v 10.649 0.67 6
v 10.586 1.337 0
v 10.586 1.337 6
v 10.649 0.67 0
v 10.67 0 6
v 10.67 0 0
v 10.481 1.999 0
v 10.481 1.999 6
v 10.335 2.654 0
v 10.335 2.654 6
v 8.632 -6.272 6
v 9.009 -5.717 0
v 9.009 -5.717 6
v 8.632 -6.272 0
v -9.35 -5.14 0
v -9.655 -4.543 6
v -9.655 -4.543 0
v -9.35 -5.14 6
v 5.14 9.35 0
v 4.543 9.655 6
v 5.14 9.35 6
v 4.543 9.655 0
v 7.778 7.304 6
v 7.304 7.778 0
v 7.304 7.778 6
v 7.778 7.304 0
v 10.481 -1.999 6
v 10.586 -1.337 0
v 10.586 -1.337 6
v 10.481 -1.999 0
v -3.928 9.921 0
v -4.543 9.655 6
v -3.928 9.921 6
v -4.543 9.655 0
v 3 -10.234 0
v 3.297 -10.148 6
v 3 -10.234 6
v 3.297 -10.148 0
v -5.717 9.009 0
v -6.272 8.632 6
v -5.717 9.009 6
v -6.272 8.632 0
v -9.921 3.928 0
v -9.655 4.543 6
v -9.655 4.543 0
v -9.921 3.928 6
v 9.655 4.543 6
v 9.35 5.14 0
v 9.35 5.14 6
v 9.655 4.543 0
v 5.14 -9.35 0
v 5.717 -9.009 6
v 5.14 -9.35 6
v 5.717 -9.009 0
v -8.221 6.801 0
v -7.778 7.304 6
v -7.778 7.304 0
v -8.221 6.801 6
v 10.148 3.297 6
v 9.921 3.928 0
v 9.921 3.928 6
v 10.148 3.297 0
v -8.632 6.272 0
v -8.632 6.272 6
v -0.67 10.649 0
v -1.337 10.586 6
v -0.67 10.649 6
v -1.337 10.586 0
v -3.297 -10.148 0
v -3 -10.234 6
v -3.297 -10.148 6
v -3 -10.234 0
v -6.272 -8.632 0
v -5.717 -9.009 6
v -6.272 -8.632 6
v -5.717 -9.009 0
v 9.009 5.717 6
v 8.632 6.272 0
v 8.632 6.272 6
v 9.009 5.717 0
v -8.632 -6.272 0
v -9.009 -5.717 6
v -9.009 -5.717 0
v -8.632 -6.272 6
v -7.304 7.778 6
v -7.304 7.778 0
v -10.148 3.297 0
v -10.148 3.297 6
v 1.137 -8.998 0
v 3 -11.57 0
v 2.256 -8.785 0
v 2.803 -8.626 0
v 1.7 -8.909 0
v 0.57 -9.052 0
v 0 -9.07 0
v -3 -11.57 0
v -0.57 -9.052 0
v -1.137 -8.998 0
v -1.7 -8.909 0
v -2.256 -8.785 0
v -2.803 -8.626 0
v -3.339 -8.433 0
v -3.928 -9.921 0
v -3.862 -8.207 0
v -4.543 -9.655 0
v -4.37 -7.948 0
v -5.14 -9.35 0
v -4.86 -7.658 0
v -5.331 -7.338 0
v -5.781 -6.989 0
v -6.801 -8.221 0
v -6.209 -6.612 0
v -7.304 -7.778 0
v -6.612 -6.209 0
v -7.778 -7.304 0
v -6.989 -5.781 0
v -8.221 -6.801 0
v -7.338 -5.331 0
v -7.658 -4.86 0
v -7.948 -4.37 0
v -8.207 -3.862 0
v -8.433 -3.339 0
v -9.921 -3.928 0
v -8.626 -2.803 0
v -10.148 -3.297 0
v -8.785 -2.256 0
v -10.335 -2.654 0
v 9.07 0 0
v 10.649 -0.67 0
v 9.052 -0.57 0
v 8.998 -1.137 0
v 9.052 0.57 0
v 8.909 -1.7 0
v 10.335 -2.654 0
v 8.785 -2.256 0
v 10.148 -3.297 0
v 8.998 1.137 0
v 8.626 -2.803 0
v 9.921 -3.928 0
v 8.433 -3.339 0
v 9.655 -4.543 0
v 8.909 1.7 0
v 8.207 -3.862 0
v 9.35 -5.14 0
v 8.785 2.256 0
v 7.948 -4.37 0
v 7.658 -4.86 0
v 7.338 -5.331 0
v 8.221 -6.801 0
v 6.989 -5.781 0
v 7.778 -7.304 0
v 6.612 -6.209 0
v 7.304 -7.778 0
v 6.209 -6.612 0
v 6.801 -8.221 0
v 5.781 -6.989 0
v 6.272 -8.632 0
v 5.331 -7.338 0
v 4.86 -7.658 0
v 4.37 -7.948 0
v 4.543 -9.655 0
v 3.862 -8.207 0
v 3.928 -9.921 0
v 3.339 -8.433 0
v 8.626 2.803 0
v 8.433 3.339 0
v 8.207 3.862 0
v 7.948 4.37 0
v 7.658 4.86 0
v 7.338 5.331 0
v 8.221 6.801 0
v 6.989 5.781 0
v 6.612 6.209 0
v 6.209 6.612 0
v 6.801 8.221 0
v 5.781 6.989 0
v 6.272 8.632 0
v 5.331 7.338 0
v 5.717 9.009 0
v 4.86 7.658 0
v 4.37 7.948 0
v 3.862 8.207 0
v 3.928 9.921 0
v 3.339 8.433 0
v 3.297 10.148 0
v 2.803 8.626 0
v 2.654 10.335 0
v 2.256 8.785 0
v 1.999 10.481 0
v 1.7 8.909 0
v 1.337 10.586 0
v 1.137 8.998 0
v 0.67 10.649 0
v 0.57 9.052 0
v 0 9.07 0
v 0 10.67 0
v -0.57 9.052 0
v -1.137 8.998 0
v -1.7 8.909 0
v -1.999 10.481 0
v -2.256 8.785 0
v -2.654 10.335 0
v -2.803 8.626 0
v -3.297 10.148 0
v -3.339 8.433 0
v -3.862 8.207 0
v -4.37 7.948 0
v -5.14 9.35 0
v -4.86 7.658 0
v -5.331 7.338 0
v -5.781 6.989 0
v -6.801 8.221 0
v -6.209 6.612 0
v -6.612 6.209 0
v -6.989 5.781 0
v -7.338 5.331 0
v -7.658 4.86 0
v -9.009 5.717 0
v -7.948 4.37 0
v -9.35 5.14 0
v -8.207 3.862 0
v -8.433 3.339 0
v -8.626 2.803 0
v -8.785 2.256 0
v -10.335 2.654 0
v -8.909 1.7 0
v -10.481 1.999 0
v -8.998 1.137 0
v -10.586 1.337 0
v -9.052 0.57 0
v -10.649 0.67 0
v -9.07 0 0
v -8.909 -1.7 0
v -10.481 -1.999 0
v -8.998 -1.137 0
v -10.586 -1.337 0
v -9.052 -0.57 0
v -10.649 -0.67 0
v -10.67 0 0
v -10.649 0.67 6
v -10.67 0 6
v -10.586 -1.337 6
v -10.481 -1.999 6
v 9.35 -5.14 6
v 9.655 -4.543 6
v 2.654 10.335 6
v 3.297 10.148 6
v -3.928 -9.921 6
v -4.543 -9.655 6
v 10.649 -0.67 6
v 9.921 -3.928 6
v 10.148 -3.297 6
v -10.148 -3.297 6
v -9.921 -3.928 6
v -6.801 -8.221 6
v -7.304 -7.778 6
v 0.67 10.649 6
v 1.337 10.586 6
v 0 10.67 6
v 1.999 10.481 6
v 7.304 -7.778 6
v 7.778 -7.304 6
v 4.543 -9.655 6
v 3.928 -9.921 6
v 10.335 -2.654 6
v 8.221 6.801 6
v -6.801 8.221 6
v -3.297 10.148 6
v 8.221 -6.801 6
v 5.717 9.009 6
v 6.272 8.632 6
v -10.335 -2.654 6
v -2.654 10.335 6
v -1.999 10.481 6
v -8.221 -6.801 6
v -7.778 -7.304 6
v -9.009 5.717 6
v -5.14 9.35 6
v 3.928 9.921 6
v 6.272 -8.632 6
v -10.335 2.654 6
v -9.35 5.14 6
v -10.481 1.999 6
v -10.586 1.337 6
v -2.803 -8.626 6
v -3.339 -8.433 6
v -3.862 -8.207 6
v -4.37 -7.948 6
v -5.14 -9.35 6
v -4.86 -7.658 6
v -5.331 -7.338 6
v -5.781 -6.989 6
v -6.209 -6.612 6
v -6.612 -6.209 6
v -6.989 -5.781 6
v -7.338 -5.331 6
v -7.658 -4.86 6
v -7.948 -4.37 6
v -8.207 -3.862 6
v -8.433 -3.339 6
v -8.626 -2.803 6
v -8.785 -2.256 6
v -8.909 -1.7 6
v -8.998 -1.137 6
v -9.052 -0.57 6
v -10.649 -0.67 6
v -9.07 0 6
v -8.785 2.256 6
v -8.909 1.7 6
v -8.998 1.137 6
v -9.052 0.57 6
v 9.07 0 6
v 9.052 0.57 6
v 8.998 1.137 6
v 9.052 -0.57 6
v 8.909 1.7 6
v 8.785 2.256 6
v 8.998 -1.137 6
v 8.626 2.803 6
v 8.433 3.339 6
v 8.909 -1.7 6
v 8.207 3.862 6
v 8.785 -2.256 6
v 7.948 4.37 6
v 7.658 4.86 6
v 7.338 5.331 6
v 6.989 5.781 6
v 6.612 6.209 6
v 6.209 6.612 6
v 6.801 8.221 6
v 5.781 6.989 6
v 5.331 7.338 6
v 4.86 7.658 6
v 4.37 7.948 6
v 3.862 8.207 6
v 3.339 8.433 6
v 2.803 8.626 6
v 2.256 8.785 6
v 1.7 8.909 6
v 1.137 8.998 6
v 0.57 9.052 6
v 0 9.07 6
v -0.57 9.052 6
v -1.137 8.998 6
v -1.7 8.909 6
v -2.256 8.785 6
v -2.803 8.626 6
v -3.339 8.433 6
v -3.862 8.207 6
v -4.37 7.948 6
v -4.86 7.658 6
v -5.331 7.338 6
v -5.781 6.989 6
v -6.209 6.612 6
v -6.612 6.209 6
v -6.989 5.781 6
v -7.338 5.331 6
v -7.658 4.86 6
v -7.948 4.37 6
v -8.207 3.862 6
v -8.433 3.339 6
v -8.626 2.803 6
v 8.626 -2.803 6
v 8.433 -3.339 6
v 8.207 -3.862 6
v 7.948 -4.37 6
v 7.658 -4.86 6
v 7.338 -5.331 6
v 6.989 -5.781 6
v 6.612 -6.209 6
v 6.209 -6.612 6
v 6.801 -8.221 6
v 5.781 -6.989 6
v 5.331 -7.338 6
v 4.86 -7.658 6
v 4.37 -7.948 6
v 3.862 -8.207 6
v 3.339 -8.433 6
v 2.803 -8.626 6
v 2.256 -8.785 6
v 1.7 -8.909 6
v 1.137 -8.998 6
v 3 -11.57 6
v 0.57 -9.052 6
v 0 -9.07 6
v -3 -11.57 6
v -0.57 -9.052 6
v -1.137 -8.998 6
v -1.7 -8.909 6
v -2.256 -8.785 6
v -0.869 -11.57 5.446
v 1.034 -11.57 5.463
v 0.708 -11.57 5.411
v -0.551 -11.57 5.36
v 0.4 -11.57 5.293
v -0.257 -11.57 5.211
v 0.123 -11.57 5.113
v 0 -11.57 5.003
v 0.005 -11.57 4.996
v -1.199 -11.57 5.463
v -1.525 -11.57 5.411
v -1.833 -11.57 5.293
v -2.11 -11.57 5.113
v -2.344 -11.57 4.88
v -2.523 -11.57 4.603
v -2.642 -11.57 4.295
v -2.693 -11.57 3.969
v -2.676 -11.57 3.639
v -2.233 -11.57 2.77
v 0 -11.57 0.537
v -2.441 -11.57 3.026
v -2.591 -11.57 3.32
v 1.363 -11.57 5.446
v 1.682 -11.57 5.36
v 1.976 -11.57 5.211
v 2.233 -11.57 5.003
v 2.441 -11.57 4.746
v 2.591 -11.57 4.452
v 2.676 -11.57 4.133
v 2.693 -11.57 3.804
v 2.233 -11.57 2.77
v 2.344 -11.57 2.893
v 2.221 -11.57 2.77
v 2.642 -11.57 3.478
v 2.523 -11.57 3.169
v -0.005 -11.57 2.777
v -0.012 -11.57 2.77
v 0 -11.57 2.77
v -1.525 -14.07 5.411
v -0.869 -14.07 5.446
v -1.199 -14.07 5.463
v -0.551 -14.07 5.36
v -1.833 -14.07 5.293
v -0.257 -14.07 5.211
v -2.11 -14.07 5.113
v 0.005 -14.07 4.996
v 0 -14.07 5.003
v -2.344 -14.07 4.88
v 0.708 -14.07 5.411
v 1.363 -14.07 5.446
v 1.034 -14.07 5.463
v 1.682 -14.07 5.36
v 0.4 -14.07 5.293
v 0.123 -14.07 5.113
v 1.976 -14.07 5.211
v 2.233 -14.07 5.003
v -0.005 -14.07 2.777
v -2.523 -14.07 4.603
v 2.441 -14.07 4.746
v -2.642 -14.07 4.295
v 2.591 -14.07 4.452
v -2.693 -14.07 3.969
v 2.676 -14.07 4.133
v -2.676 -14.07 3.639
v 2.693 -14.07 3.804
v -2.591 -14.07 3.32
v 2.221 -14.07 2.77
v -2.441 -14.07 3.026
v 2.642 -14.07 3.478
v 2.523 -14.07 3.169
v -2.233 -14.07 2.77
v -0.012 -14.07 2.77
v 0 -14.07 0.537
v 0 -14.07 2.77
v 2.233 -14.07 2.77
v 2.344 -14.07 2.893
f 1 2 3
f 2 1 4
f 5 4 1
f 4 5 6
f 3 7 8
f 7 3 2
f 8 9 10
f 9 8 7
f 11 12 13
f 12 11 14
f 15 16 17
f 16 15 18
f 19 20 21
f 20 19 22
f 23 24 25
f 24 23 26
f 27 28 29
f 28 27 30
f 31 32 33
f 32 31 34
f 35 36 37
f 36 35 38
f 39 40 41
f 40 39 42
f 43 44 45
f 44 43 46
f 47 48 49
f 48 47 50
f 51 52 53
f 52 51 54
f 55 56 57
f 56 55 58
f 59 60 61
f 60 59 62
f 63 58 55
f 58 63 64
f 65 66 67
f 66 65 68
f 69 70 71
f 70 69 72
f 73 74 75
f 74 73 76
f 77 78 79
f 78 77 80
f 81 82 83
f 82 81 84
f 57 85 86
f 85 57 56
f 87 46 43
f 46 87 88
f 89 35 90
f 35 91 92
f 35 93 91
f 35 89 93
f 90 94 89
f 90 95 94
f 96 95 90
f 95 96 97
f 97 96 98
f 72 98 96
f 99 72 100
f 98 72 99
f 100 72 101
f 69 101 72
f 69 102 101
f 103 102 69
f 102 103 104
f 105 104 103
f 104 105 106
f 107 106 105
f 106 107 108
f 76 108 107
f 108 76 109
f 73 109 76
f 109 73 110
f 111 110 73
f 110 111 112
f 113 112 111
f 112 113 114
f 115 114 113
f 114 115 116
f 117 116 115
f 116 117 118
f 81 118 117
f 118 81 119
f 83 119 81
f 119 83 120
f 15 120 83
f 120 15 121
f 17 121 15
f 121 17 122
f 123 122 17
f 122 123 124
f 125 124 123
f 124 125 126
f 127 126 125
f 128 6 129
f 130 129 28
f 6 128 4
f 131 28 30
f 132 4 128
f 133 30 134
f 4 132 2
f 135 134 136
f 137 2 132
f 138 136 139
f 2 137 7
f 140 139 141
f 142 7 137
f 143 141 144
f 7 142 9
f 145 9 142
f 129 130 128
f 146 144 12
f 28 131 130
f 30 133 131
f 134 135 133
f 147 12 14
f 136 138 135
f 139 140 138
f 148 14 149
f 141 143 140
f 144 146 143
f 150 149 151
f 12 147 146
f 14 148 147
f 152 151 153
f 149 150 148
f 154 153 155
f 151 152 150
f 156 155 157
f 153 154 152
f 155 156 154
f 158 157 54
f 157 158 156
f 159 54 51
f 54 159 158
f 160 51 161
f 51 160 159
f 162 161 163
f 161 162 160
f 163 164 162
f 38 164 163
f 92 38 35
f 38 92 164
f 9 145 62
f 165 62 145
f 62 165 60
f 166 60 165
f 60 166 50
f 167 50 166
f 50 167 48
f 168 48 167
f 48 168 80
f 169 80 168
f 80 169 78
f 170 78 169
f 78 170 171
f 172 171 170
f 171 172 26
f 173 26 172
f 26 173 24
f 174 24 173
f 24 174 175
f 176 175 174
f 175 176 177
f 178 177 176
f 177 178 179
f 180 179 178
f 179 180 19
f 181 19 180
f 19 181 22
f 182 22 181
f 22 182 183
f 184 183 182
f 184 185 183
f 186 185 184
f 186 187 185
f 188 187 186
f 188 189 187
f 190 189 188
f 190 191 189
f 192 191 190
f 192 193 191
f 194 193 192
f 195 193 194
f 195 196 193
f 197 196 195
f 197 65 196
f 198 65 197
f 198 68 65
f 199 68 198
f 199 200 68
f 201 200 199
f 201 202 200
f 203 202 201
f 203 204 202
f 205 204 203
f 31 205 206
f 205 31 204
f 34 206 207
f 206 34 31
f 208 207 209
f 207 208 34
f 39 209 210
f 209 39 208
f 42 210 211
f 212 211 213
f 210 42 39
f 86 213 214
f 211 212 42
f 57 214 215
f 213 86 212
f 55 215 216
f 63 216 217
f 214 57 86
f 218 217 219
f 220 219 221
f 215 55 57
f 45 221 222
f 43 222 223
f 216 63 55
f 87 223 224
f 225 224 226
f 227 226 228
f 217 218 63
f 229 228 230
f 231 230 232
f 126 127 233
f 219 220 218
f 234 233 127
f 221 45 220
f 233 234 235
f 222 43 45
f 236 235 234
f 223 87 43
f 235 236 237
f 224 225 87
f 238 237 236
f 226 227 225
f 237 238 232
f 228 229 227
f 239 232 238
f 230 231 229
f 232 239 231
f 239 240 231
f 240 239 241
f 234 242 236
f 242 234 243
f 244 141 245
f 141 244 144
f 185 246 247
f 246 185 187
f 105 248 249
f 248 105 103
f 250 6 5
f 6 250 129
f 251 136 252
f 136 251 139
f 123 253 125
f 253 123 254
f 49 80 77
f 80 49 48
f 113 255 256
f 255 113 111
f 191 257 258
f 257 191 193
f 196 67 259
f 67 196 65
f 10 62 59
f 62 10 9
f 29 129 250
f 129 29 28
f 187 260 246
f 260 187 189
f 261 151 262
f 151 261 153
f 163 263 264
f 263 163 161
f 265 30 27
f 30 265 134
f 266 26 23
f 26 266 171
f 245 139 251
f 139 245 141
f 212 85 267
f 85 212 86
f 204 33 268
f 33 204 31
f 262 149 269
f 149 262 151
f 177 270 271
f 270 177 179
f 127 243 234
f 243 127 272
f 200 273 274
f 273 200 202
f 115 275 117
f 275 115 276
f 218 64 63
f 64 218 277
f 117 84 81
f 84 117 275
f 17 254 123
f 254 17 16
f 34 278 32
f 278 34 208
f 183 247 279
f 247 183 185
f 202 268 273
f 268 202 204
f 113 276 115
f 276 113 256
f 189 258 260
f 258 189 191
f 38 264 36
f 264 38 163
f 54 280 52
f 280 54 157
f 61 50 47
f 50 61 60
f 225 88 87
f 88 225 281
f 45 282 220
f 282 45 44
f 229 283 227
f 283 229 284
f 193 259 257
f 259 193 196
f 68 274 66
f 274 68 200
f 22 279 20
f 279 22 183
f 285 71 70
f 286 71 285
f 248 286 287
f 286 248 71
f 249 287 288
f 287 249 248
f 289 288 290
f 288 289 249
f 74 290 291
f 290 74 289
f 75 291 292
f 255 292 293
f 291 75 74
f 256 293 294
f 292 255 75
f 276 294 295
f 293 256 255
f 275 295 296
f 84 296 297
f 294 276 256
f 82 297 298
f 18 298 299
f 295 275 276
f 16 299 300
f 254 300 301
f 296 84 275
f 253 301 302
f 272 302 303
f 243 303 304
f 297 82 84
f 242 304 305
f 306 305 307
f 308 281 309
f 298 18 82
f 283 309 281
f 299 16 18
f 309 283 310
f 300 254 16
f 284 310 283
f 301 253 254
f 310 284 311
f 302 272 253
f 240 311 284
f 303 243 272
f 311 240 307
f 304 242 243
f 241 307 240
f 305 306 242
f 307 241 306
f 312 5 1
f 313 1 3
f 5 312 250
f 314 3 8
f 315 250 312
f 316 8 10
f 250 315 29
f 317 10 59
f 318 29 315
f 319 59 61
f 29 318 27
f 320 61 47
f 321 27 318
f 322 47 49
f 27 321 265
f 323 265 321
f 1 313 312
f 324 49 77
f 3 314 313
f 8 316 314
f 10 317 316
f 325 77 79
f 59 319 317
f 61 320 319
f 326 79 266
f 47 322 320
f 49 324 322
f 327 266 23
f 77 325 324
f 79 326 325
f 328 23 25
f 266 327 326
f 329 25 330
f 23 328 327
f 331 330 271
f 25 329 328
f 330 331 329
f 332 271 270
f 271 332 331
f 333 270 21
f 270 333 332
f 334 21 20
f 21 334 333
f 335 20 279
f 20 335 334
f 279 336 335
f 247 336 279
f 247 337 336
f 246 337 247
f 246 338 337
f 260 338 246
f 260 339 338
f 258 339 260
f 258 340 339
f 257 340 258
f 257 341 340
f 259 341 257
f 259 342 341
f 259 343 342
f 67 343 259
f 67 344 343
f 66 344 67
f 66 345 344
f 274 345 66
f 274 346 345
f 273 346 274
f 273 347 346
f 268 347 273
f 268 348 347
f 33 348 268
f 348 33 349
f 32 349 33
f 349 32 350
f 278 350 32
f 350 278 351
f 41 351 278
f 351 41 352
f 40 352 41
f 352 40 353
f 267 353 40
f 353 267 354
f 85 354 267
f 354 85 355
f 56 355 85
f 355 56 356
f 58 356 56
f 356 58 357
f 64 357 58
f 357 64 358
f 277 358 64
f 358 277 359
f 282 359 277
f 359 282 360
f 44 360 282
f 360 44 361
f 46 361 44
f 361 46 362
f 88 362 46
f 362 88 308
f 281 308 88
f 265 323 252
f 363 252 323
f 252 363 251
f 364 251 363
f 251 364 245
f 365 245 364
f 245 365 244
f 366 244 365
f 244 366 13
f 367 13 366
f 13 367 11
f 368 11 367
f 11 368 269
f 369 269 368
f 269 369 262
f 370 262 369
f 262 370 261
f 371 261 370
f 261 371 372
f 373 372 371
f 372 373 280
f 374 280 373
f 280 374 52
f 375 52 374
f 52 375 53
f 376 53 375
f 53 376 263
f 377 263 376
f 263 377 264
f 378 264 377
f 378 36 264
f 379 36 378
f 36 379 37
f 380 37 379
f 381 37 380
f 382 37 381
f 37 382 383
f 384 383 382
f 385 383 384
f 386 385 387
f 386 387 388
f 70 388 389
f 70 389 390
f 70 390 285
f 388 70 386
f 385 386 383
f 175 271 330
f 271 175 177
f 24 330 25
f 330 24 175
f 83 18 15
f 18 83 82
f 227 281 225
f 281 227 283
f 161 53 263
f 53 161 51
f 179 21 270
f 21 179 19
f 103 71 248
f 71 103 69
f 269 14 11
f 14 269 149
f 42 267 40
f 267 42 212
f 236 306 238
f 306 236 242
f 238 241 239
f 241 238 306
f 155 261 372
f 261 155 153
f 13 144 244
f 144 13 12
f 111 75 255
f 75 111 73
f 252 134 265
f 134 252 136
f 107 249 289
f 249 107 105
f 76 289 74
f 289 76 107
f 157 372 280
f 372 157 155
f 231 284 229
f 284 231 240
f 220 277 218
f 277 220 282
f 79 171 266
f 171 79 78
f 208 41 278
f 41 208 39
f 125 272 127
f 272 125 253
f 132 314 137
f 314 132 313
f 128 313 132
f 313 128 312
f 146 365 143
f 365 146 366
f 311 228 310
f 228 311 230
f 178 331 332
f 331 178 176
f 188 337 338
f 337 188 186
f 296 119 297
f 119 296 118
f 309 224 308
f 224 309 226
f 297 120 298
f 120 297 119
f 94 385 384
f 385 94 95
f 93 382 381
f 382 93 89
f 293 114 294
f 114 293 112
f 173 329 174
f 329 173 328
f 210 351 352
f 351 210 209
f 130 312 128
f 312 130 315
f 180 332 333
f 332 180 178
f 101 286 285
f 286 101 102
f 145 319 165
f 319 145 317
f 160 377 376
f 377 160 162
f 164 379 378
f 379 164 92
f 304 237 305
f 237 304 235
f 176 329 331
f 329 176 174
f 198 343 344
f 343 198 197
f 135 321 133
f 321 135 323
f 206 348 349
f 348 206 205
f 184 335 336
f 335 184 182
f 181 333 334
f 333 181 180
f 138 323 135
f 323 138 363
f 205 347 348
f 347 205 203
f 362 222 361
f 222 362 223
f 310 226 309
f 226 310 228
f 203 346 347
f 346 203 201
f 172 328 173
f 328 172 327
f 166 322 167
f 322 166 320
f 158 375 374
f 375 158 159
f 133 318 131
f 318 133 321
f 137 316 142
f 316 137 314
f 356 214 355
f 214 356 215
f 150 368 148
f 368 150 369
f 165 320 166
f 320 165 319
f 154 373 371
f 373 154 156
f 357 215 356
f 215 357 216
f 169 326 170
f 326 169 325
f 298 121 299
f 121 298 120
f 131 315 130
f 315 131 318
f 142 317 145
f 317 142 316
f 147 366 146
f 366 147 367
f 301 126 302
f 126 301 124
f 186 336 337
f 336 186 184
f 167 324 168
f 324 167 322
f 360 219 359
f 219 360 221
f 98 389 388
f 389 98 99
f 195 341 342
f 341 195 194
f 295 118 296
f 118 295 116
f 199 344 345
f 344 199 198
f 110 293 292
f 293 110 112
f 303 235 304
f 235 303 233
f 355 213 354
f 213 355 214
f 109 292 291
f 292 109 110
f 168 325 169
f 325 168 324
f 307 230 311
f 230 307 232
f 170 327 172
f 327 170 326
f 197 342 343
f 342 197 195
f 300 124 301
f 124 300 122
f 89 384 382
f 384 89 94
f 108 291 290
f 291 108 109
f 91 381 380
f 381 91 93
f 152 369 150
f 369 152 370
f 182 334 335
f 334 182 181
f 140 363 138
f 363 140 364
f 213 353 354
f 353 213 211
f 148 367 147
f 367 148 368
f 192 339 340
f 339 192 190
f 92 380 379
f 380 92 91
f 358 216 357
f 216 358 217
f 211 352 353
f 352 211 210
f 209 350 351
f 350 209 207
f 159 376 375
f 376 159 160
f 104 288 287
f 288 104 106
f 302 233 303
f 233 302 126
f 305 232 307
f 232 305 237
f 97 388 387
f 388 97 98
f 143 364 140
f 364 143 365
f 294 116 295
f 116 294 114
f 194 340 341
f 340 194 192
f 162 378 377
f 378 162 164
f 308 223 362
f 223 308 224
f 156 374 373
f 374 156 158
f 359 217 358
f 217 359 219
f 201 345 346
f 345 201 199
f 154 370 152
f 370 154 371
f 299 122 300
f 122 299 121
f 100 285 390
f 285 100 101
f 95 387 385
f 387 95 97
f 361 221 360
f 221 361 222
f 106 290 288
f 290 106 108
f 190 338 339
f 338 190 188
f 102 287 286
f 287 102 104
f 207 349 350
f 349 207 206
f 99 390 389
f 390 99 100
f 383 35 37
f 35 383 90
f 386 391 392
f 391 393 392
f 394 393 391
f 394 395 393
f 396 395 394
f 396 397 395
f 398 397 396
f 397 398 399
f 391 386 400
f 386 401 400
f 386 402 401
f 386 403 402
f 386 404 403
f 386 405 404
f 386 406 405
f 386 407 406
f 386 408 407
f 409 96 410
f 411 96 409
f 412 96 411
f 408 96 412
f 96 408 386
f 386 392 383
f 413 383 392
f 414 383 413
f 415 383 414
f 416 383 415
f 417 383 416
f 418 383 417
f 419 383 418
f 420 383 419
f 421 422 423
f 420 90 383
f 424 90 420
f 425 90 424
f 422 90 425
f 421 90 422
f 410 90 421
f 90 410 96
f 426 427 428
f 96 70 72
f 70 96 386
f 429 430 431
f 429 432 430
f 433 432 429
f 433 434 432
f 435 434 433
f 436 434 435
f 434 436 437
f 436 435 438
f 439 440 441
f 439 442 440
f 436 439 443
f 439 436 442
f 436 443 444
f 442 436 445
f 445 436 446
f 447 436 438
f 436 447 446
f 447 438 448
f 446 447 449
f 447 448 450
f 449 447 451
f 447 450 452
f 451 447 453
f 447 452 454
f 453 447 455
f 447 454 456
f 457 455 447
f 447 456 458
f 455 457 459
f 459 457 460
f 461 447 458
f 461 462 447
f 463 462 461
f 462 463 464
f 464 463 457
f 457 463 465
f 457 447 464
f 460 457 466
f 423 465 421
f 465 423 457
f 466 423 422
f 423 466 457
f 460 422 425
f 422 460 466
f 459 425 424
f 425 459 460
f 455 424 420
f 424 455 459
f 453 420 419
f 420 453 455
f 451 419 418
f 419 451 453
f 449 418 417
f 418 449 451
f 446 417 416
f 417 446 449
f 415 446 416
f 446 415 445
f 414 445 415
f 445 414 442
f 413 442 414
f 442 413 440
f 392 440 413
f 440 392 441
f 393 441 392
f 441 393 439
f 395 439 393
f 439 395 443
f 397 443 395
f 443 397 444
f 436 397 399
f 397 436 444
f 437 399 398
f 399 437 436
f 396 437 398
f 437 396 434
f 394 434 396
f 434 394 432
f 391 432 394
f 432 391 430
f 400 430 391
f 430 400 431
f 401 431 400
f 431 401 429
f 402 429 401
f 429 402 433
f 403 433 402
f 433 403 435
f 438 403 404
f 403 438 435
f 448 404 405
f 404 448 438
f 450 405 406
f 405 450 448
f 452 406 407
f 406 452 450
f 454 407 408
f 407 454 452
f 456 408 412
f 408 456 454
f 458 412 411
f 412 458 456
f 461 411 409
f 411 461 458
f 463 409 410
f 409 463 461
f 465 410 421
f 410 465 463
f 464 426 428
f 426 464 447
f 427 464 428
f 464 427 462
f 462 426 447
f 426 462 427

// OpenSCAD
//For Matching Ring, Please use same Ring Width
//But you can select different ring size for each one

//CUSTOMIZER VARIABLES
ring_type = 1;//[0:Male,1:Female]

//(US Ring Sizes)
ring_size = 18.14;//[11.63:0,11.84:0.25,12.04:0.5,12.24:0.75,12.45:1,12.65:1.25,12.85:1.5,13.06:1.75,13.26:2,13.46:2.25,13.67:2.5,13.87:2.75,14.07:3,14.27:3.25,14.48:3.5,14.68:3.75,14.88:4,15.09:4.25,15.29:4.5,15.49:4.75,2215.9:5.25,16.1:5.5,16.31:5.75,16.51:6,16.71:6.25,16.92:6.5,17.12:6.75,17.32:7,17.53:7.25,17.73:7.5,17.93:7.75,18.14:8,18.34:8.25,18.54:8.5,18.75:8.75,18.95:9,19.15:9.25,19.35:9.5,19.56:9.75,19.76:10,19.96:10.25,20.17:10.5,20.37:10.75,20.57:11,20.78:11.25,20.98:11.5,21.18:11.75,21.39:12,21.59:12.25,21.79:12.5,22:12.75,22.2:13,22.4:13.25,22.61:13.5,22.81:13.75,23.01:14,23.22:14.25,23.42:14.5,23.62:14.75,23.83:15,24.03:15.25,24.23:15.5,24.43:15.75,24.64:16]

ring_thickness = 1.6;//[1.6:Normal,2.4:Thick]

ring_width = 6;//[6:12]

ring_top_high = 5;//[4:8]

//CUSTOMIZER VARIABLES END
inner_radius = ring_size/2;

translate ([0,0,ring_width/2])
union () {
ring();
translate ([0,-inner_radius,0])
rotate(a=90,v=[1,0,0])

if(ring_type == 0){
	ringtop1 (ring_width,ring_top_high);
} else {
	ringtop2 (ring_width,ring_top_high);
}
}

module ring() {

difference() {
			cylinder(r=inner_radius+ring_thickness,h=ring_width,$fn = 100,center = true);
			cylinder(r=inner_radius,h=ring_width+1,$fn = 100,center = true);
}

}

module heart (w,h) {
scale (v=[w/171,w/171,1])
translate([0,-78,0])
rotate (a=45, v=[0,0,1])
linear_extrude(height = h,convexity =10, twist =0 ) {
polygon(points=[[0,0],[100,0],[0,100]], paths=[[0,1,2]]);
translate([100,50,0])
circle(r=50);
translate([50,100,0])
circle(r=50);
}
}

module ringtop1 (w,h) {
difference() {
translate ([-w/2,-w/2,0])
cube (size=[w,w,h]);
translate ([0,0,h*0.5])
heart (w*0.9+0.3,h*0.5);
}
}

module ringtop2 (w,h) {
union() {
translate ([-w/2,-w/2,0])
cube (size=[w,w,h*.5]);
heart (w*0.9,h);
}
}
